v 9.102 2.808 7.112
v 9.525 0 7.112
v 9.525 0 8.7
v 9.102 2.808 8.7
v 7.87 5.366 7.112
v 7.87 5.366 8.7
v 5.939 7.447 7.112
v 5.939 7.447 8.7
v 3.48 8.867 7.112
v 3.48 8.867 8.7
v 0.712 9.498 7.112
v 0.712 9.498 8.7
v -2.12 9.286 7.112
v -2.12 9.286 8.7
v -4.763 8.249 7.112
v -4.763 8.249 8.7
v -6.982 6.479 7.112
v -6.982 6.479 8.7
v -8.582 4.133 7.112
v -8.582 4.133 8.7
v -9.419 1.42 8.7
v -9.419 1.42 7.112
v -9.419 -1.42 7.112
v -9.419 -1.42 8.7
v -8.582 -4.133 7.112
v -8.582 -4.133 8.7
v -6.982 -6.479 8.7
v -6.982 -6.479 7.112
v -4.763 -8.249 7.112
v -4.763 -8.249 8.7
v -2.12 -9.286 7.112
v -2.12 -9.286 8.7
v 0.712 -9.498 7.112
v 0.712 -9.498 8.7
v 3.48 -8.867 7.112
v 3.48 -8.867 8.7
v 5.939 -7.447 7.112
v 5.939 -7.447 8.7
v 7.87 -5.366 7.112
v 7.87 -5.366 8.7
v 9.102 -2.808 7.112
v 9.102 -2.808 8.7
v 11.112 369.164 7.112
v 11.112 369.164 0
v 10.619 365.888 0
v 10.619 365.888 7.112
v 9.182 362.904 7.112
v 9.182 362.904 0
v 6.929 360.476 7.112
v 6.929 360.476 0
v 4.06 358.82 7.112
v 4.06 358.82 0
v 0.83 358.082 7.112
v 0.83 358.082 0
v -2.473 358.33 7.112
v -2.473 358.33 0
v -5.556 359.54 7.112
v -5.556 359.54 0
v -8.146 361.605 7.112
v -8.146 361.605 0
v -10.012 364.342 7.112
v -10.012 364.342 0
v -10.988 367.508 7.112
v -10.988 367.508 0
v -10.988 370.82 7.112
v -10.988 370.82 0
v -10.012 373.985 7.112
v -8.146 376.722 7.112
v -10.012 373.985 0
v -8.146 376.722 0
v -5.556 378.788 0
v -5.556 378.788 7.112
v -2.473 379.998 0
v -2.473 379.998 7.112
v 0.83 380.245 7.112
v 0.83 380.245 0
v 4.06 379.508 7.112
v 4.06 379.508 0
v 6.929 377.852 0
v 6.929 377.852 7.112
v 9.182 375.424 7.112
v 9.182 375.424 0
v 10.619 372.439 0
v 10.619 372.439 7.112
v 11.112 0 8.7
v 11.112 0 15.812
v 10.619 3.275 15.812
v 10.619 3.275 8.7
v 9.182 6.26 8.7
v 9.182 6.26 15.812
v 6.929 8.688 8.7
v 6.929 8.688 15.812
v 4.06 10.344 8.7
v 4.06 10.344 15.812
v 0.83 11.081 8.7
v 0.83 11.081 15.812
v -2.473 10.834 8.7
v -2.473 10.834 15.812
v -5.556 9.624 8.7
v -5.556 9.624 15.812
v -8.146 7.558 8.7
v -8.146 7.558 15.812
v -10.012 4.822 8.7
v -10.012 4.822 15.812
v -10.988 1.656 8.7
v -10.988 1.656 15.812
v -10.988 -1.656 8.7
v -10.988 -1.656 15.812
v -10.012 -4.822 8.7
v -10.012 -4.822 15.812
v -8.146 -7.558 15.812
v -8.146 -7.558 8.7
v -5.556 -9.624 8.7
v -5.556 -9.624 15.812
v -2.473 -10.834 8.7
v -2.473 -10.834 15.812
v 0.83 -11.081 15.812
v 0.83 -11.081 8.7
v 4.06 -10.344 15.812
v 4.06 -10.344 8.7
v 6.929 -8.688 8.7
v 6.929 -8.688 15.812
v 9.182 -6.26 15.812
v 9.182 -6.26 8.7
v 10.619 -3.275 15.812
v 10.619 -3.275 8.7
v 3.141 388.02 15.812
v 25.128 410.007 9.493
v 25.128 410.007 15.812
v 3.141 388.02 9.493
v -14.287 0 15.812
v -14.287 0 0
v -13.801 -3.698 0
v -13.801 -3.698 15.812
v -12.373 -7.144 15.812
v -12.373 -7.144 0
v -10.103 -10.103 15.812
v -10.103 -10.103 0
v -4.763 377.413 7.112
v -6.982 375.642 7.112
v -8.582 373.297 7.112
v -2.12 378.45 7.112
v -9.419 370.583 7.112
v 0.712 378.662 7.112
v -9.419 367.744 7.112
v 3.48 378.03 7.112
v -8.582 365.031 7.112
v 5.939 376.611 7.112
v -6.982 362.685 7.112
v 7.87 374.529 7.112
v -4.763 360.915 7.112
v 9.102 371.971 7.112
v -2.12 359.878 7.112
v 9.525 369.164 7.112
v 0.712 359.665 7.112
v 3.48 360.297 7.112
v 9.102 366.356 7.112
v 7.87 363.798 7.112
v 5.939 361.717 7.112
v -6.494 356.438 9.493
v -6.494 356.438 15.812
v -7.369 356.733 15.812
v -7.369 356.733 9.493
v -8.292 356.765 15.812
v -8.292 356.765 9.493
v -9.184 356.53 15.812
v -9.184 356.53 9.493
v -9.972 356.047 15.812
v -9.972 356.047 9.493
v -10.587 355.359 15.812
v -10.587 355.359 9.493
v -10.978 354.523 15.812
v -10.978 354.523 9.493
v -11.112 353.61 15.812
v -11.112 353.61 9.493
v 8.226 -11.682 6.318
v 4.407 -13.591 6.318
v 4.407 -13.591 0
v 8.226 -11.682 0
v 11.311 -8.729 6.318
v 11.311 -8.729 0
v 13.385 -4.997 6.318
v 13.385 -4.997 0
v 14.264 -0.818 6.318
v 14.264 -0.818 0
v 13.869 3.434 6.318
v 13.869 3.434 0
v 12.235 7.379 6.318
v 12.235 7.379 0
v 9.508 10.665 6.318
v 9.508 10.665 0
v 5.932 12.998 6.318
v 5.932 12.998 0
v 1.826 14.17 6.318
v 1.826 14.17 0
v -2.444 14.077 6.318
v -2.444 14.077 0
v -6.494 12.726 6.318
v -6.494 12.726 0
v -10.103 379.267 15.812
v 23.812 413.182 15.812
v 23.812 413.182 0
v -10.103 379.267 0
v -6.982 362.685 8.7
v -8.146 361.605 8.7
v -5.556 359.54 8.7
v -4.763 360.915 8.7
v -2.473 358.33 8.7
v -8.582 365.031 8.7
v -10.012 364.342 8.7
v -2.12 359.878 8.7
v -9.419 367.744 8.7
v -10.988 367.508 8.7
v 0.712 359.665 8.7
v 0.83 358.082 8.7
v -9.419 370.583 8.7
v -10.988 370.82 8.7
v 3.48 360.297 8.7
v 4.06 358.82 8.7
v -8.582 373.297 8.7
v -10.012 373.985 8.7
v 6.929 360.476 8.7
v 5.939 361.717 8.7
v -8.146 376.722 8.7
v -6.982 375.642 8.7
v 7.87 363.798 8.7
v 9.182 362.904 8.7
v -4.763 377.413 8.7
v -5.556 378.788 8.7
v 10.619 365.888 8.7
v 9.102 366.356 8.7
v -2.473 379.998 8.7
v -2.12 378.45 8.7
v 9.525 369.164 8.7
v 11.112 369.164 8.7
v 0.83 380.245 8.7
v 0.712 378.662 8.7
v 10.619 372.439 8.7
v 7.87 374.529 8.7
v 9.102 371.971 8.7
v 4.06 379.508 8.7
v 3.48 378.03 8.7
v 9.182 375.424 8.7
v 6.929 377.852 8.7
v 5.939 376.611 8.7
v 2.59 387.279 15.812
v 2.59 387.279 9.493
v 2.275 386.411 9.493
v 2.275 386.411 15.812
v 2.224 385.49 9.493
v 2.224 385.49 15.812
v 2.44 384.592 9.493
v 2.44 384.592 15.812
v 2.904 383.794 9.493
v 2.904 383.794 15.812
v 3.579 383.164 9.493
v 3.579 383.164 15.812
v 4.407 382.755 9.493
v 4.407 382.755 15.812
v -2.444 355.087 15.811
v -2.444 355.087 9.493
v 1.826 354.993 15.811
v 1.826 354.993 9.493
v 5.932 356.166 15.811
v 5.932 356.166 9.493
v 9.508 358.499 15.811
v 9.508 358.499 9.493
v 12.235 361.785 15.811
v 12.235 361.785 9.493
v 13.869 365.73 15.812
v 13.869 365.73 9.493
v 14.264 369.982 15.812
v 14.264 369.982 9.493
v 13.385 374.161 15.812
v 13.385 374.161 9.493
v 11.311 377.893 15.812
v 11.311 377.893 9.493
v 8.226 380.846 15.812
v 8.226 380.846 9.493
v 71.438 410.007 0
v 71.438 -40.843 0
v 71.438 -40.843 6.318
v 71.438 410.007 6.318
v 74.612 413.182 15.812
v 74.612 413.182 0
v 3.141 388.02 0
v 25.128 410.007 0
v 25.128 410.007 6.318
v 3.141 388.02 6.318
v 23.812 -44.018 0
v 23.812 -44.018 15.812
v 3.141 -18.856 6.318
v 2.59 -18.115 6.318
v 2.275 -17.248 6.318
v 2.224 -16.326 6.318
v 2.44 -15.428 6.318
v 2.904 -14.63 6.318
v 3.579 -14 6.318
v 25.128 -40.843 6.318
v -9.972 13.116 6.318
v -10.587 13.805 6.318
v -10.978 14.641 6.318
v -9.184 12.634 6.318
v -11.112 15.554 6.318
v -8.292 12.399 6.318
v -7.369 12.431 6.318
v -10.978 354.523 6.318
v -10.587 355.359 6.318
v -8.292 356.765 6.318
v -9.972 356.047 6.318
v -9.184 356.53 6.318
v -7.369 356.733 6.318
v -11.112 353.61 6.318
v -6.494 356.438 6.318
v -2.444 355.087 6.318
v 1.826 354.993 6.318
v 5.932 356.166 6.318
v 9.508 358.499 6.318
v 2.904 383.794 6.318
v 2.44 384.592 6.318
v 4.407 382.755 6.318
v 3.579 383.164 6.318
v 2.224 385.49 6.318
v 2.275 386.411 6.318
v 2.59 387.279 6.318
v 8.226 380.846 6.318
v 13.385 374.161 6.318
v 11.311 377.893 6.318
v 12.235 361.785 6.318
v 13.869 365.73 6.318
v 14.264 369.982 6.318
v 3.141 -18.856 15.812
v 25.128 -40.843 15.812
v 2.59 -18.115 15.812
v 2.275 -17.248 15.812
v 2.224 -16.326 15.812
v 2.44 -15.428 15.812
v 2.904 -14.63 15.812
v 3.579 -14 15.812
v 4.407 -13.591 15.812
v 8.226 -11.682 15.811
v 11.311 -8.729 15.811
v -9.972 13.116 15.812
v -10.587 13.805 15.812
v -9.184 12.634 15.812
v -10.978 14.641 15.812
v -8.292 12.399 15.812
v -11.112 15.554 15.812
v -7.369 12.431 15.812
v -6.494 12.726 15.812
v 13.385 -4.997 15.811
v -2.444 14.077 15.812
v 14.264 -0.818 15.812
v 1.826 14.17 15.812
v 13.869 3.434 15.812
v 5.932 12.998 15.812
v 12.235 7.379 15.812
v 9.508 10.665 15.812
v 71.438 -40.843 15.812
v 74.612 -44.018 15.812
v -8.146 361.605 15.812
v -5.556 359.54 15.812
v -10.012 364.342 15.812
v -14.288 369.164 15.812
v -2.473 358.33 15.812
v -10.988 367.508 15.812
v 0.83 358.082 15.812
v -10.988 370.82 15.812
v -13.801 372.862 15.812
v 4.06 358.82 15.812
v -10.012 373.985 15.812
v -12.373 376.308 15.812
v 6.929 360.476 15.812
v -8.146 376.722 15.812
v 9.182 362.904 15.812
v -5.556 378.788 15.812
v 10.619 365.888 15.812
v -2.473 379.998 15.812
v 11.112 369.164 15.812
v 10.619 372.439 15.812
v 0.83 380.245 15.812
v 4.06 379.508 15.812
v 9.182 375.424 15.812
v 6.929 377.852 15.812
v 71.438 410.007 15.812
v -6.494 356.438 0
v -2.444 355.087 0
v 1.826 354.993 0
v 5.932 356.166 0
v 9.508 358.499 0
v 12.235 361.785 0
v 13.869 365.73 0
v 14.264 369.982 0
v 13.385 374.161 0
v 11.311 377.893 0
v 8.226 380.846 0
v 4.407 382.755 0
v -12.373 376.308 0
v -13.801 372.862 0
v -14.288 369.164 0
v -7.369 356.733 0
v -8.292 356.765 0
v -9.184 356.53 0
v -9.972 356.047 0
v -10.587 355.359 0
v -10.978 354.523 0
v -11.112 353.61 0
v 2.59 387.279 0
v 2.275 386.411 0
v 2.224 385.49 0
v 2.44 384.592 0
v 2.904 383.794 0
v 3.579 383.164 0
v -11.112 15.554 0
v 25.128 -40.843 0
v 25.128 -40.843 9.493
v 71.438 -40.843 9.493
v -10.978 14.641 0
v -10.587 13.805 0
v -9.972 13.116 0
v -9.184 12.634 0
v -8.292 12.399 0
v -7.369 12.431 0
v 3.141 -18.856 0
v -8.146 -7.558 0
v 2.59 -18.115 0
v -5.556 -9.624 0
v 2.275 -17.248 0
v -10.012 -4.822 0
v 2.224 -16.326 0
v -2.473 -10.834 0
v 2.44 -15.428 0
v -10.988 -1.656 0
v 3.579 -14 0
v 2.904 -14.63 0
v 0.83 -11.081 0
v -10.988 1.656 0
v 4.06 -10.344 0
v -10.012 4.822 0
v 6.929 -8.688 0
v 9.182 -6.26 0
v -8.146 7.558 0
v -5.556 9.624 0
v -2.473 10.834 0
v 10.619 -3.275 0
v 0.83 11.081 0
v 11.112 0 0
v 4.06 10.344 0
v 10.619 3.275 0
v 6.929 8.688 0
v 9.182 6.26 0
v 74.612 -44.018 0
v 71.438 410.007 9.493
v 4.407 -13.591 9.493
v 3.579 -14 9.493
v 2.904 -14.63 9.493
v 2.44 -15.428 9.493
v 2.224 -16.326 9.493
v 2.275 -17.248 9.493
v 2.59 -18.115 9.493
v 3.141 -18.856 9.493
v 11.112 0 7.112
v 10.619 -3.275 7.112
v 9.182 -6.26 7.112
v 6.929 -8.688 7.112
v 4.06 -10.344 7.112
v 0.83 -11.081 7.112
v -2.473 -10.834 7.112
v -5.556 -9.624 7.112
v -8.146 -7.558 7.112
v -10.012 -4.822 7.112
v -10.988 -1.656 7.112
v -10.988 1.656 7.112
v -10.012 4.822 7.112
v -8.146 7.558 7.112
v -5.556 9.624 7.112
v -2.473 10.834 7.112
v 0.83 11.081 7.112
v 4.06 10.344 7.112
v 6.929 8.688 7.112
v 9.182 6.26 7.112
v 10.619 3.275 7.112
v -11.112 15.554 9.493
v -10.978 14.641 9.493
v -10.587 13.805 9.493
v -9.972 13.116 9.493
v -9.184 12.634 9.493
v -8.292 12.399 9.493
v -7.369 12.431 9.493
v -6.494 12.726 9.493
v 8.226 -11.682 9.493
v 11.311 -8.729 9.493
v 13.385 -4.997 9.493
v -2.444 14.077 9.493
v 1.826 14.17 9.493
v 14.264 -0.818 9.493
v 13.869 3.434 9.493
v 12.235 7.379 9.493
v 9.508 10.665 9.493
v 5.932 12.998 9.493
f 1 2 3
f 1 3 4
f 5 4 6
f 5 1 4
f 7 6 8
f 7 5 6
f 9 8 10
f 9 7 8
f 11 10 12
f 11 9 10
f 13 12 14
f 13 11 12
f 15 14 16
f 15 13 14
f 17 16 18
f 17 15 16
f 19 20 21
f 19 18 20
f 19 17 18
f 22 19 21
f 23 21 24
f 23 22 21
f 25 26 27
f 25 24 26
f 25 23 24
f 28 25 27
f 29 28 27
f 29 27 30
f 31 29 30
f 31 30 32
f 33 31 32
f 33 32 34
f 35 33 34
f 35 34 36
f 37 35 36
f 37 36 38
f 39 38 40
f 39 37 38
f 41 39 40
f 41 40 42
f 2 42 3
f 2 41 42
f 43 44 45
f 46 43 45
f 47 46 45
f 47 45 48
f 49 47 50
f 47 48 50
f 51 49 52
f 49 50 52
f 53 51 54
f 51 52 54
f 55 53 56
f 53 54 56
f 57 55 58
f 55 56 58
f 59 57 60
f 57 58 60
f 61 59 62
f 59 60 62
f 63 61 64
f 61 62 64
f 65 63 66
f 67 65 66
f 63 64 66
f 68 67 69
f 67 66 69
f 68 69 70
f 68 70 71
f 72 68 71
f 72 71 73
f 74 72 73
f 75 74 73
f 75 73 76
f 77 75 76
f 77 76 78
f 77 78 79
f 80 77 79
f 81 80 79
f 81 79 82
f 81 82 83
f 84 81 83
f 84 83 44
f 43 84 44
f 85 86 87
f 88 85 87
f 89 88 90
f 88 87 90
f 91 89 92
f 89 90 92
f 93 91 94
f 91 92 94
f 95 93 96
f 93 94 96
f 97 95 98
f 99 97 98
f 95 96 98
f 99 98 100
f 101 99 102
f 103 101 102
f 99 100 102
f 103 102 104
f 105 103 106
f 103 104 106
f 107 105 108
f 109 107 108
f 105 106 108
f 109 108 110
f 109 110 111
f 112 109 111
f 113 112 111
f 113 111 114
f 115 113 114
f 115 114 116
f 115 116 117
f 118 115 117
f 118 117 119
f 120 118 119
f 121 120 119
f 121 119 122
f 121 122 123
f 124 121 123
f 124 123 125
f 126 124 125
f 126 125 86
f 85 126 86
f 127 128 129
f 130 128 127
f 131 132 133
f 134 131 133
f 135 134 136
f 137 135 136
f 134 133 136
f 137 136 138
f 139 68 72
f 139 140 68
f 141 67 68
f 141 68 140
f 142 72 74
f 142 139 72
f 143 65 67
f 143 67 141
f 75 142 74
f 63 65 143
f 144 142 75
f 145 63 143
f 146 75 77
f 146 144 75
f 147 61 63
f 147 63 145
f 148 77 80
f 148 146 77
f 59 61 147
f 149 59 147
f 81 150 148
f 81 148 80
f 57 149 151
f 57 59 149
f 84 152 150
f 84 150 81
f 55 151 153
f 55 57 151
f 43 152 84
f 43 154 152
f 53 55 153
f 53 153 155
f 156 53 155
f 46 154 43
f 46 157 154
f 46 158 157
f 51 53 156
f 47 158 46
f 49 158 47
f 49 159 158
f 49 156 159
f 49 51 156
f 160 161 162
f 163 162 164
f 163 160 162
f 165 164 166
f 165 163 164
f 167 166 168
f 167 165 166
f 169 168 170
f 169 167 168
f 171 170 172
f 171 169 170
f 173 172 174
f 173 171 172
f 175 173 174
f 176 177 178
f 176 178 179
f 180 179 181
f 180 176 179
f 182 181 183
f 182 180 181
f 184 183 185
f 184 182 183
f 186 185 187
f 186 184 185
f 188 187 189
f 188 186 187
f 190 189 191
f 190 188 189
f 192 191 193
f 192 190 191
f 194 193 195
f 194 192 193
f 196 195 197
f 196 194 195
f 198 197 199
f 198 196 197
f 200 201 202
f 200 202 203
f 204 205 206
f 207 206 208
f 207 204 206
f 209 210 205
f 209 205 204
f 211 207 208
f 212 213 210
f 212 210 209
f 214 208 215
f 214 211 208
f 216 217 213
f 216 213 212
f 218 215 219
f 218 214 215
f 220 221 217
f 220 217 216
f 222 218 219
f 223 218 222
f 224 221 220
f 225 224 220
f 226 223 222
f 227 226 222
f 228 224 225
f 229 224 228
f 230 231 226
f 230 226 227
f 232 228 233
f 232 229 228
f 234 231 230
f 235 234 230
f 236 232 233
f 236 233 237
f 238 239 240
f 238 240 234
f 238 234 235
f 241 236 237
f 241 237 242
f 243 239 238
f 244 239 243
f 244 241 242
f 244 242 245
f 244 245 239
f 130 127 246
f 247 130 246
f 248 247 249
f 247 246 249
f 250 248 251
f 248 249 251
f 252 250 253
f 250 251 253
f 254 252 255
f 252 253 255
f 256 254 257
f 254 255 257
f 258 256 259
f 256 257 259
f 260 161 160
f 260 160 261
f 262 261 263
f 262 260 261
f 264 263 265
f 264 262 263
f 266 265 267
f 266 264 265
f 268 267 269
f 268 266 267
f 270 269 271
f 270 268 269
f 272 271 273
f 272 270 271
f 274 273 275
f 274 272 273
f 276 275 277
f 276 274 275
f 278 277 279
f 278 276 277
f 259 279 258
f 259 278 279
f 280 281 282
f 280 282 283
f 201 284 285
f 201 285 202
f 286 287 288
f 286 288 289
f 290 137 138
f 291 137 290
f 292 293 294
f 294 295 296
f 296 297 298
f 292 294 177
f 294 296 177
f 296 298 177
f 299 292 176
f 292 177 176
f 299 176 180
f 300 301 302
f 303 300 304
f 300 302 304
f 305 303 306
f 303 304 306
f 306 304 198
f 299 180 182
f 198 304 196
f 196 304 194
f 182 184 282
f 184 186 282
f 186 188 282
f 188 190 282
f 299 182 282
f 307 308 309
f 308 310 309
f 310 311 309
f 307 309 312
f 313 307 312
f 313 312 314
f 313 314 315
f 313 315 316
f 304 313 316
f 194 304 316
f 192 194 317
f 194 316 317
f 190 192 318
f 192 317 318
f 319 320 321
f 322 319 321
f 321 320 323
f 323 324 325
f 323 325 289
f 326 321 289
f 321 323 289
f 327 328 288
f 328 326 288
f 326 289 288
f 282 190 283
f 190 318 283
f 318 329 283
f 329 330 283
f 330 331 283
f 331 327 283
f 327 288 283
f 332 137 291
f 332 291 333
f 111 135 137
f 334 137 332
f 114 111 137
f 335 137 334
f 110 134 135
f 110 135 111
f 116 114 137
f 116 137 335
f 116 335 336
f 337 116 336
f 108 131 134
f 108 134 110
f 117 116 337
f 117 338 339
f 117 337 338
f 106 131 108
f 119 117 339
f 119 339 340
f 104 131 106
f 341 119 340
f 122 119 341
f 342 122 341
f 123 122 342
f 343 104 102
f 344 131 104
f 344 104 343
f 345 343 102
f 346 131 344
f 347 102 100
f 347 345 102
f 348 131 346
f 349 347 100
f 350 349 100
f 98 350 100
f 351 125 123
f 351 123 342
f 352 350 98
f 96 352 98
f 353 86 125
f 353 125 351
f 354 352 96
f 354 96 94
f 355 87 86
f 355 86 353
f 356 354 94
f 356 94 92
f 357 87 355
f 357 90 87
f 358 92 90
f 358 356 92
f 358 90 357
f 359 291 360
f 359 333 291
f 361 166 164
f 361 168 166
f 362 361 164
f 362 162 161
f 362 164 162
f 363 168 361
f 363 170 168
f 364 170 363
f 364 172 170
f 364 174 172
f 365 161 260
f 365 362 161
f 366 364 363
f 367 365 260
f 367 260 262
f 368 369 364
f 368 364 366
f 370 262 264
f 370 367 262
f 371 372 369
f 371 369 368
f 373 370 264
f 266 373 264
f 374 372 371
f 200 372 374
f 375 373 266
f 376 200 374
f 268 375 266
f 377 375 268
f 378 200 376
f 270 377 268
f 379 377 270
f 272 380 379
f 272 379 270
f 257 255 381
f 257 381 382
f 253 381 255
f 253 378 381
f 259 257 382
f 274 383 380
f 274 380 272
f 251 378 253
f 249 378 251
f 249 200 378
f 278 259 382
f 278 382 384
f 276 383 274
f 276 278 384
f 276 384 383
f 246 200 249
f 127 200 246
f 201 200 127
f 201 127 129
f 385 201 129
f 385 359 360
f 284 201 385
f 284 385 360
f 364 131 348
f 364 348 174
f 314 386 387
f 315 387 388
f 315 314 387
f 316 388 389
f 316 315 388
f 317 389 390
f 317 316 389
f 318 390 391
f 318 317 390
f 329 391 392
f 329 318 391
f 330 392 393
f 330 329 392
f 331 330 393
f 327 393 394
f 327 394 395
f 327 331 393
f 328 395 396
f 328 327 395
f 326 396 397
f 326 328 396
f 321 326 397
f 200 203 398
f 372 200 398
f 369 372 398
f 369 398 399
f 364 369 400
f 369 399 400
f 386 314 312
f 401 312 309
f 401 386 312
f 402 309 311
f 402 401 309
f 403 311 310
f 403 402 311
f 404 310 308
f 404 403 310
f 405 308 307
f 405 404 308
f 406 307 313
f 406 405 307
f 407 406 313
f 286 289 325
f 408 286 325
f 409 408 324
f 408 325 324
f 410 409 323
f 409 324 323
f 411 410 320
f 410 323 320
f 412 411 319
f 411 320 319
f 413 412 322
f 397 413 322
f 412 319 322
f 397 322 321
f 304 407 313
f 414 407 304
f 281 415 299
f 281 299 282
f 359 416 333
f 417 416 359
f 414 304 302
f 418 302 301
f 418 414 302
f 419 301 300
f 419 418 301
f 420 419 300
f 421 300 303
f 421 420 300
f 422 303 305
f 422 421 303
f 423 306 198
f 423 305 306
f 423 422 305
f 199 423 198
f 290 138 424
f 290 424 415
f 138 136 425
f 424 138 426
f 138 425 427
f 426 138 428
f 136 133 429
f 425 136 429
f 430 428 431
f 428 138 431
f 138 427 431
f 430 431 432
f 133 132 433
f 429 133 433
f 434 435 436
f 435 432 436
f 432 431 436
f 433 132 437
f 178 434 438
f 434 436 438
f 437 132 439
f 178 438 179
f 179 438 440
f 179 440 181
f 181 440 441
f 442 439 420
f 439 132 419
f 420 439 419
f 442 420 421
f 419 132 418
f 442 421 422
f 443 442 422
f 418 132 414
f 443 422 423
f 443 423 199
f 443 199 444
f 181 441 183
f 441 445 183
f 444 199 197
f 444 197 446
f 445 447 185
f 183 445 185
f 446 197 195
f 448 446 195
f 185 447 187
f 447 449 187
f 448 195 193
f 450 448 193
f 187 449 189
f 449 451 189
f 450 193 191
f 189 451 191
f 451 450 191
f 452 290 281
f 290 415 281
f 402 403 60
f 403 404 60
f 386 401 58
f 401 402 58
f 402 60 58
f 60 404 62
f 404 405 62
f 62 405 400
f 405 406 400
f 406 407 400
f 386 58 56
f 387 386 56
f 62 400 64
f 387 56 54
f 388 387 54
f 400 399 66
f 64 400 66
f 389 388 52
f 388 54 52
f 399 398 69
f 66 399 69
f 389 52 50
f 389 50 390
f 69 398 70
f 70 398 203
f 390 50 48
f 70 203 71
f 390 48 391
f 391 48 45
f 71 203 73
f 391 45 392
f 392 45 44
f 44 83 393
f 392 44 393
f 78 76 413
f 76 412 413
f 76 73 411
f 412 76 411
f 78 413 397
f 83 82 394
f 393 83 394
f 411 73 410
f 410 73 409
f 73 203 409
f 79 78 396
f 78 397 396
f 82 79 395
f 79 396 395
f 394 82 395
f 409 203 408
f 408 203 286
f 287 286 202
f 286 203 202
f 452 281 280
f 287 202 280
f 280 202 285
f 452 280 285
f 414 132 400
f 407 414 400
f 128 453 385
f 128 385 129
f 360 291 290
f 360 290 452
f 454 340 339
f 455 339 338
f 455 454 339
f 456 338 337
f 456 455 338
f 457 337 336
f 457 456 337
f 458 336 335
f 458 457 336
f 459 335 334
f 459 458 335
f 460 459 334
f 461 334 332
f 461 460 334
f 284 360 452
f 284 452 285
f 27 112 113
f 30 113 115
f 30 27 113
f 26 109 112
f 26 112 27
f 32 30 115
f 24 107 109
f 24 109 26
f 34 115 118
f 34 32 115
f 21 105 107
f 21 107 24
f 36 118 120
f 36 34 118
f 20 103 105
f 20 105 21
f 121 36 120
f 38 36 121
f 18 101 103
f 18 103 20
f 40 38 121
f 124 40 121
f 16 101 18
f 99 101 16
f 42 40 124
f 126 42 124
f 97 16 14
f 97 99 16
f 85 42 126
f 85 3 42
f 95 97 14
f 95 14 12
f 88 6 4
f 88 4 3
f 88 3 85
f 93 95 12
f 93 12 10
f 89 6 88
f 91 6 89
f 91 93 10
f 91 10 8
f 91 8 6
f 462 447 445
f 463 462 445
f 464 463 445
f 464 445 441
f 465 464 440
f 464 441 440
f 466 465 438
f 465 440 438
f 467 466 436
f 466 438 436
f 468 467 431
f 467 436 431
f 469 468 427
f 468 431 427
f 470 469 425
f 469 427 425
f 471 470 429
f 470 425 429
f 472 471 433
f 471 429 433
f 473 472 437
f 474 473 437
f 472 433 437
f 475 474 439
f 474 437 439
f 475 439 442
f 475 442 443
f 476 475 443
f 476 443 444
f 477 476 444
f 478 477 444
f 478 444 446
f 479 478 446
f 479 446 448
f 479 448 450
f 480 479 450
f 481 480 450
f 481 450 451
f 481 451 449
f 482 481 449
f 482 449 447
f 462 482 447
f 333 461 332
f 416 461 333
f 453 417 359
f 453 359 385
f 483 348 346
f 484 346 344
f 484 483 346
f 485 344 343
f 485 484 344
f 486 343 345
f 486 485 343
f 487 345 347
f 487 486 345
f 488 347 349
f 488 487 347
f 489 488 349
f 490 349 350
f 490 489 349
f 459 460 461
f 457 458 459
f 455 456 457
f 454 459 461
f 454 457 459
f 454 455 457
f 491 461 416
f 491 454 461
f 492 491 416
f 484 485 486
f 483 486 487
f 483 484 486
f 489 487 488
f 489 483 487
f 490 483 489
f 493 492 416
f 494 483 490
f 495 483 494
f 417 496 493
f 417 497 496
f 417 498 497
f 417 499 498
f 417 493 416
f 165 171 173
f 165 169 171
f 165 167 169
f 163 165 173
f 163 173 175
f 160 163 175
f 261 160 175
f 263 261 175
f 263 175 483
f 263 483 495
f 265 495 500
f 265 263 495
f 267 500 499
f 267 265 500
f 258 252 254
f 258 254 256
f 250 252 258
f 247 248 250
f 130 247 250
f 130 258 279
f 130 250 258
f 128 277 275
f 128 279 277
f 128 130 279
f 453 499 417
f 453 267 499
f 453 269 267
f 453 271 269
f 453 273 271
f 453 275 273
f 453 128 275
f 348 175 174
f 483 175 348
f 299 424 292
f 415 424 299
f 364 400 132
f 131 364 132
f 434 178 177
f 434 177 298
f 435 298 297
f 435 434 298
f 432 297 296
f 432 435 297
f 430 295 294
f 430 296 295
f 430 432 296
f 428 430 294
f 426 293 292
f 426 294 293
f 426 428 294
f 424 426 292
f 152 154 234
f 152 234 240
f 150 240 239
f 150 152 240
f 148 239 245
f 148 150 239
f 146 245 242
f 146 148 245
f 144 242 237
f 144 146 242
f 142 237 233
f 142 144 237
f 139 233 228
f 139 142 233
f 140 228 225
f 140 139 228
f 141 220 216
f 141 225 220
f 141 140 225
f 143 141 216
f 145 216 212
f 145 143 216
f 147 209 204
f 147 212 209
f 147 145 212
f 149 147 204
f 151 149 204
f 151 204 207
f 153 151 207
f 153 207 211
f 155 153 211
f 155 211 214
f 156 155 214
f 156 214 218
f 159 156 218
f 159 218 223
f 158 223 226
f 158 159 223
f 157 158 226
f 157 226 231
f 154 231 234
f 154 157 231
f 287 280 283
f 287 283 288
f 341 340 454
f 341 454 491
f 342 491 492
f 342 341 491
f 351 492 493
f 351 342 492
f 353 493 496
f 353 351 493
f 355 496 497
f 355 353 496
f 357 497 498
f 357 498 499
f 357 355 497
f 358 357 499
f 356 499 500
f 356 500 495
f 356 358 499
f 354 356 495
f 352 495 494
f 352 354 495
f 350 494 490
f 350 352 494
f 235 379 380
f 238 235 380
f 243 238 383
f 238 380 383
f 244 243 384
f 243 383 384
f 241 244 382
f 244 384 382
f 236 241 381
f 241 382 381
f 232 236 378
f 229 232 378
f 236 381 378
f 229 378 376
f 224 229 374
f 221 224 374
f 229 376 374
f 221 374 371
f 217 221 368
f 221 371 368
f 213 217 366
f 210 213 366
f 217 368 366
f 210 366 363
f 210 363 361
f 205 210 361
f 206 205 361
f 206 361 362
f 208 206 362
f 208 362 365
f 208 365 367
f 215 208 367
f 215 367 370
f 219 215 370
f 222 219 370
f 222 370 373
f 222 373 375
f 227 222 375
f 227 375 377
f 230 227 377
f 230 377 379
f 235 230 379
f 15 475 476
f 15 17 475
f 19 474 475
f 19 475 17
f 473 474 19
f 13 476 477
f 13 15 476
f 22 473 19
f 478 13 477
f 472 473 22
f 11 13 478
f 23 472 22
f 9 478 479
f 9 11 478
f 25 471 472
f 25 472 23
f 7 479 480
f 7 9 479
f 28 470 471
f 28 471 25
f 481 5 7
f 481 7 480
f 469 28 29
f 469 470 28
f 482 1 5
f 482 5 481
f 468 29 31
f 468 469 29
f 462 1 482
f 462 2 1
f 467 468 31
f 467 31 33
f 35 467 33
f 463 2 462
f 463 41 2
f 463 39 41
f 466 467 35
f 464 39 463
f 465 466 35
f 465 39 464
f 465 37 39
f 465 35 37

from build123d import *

# Parameters (mm, degrees)
F0_R      = 9.525
F1_DEPTH  = 15.8115
F2_R      = 11.1125
F3_DEPTH  = 7.112
F4_R      = 11.1125
F5_DEPTH  = 7.112
F6_T      = 3.175
F7_R      = 3.175
F8_DEPTH  = 3.175
F10_R     = 11.1125
F11_DEPTH = 1.5875


# Not quite as in the source:
# - a shell that OpenCascade refuses in one call is made with other operations: the cavity is built on its own and cut out


with BuildPart() as f1:
    # F0 (on Top) → F1 (new body)
    with BuildSketch(Plane.XY):
        with BuildLine():
            Line((-14.2875, 369.1638474552), (-14.2875, 0))
            ThreePointArc((-14.2875, 0), (-13.1999288208, -5.4675895399), (-10.1027881362, -10.1027881362))
            Line((-10.1027881362, -10.1027881362), (23.8125, -44.0180762724))
            Line((23.8125, -44.0180762724), (74.6125, -44.0180762724))
            Line((74.6125, -44.0180762724), (74.6125, 413.1819237276))
            Line((74.6125, 413.1819237276), (23.8125, 413.1819237276))
            Line((23.8125, 413.1819237276), (-10.1027881362, 379.2666355914))
            ThreePointArc((-10.1027881362, 379.2666355914), (-13.1999288208, 374.6314369951), (-14.2875, 369.1638474552))
        make_face()
        Circle(F0_R, mode=Mode.SUBTRACT)
        with Locations((0, 369.1638474552)):
            Circle(F0_R, mode=Mode.SUBTRACT)
    extrude(amount=F1_DEPTH)

    # F2 (on face) → F3 (cut)
    with BuildSketch(Plane.XY.offset(15.8115)):
        with Locations((0, 369.1638474552)):
            Circle(F2_R)
        Circle(F2_R)
    extrude(amount=-F3_DEPTH, mode=Mode.SUBTRACT)

    # F4 (on face) → F5 (cut)
    with BuildSketch(Plane(origin=(0, 0, 0), x_dir=(1, 0, 0), z_dir=(0, 0, -1))):
        Circle(F4_R)
        with Locations((0, -369.1638474552)):
            Circle(F4_R)
    extrude(amount=-F5_DEPTH, mode=Mode.SUBTRACT)

    # F6: shell of thickness 3.175, made by hand


with BuildPart() as f6_core1:
    # F6_t2: copy of F1
    add(f1.part)

    # the walls: a layer under each face that stays
    f6_faces = [f6_core1.faces().sort_by_distance(p)[0] for p in [
        (-13.1999288208, 374.6314369951, 7.90575),
        (6.8548559319, 396.2242796595, 7.90575),
        (-14.2875, 184.5819237276, 7.90575),
        (30.1625, 184.5819237276, 15.8115),
        (49.2125, 413.1819237276, 7.90575),
        (-13.1999288208, -5.4675895399, 7.90575),
        (74.6125, 184.5819237276, 7.90575),
        (6.8548559319, -27.0604322043, 7.90575),
        (49.2125, -44.0180762724, 7.90575),
        (-11.1125, 0, 3.556),
        (-11.1125, 369.1638474552, 3.556),
        (-11.1125, 0, 12.2555),
        (-11.1125, 369.1638474552, 12.2555),
        (-7.4083333333, 7.4083333333, 7.112),
        (-7.4083333333, 376.5721807885, 7.112),
        (-7.4083333333, -7.4083333333, 8.6995),
        (-7.4083333333, 361.7555141219, 8.6995),
        (-9.525, 0, 7.90575),
        (-9.525, 369.1638474552, 7.90575),
    ]]
    thicken(f6_faces, amount=-F6_T, mode=Mode.SUBTRACT)

    # F6_s3 → F6_t4 (revolve, cut)
    with BuildSketch(Plane.XZ):
        Polygon((11.08075, 7.08025), (14.2875, 7.112), (14.2875, 10.287), (11.1125, 10.287), align=None)
    revolve(axis=Axis((0, 0, 7.112), (0, 0, -1)), mode=Mode.SUBTRACT)

    # F6_s5 → F6_t6 (revolve, cut)
    with BuildSketch(Plane.XZ.offset(-369.1638474552)):
        Polygon((11.08075, 7.08025), (14.2875, 7.112), (14.2875, 10.287), (11.1125, 10.287), align=None)
    revolve(axis=Axis((0, 369.1638474552, 7.112), (0, 0, -1)), mode=Mode.SUBTRACT)

    # F6_s7 → F6_t8 (revolve, cut)
    with BuildSketch(Plane.XZ):
        Polygon((11.08075, 8.73125), (14.2875, 8.6995), (14.2875, 5.5245), (11.1125, 5.5245), align=None)
    revolve(axis=Axis((0, 0, 8.6995), (0, 0, 1)), mode=Mode.SUBTRACT)

    # F6_s9 → F6_t10 (revolve, cut)
    with BuildSketch(Plane.XZ.offset(-369.1638474552)):
        Polygon((11.08075, 8.73125), (14.2875, 8.6995), (14.2875, 5.5245), (11.1125, 5.5245), align=None)
    revolve(axis=Axis((0, 369.1638474552, 8.6995), (0, 0, 1)), mode=Mode.SUBTRACT)


with BuildPart() as f1_1:
    add(f1.part)

    # what is left inside the walls is the cavity
    f6_cavity = [f6_core1.part.solids().sort_by_distance(p)[0] for p in [
        (30.1625, 109.440257, 12.60475),
    ]]
    add(f6_cavity, mode=Mode.SUBTRACT)

    # F7
    f7_edges = [f1_1.edges().sort_by_distance(p)[0] for p in [
        (-1.507724, 383.371572, 6.31825),
        (-11.1125, 360.183591, 6.31825),
        (-11.1125, 8.980256, 6.31825),
        (-1.507724, -14.207724, 6.31825),
    ]]
    fillet(f7_edges, radius=F7_R)

    # F8 (cut, through all): a face of the model
    f8_faces = [f1_1.faces().sort_by_distance(p)[0] for p in [
        (32.2546535053, 184.5819237276, 12.6365),
    ]]
    extrude(f8_faces, amount=-F8_DEPTH, mode=Mode.SUBTRACT)

    # F10 (on offset) → F11 (join, symmetric)
    with BuildSketch(Plane.XY.offset(7.90575)):
        with BuildLine():
            Line((74.6125, -44.0180762724), (74.6125, 413.1819237276))
            Line((74.6125, 413.1819237276), (23.8125, 413.1819237276))
            Line((23.8125, 413.1819237276), (-10.1027881362, 379.2666355914))
            ThreePointArc((-10.1027881362, 379.2666355914), (-13.1999288208, 374.6314369951), (-14.2875, 369.1638474552))
            Line((-14.2875, 369.1638474552), (-14.2875, 0))
            ThreePointArc((-14.2875, 0), (-13.1999288208, -5.4675895399), (-10.1027881362, -10.1027881362))
            Line((-10.1027881362, -10.1027881362), (23.8125, -44.0180762724))
            Line((23.8125, -44.0180762724), (74.6125, -44.0180762724))
        make_face()
        Circle(F10_R, mode=Mode.SUBTRACT)
        with Locations((0, 369.1638474552)):
            Circle(F10_R, mode=Mode.SUBTRACT)
    extrude(amount=F11_DEPTH, both=True)


solid = f1_1.part
